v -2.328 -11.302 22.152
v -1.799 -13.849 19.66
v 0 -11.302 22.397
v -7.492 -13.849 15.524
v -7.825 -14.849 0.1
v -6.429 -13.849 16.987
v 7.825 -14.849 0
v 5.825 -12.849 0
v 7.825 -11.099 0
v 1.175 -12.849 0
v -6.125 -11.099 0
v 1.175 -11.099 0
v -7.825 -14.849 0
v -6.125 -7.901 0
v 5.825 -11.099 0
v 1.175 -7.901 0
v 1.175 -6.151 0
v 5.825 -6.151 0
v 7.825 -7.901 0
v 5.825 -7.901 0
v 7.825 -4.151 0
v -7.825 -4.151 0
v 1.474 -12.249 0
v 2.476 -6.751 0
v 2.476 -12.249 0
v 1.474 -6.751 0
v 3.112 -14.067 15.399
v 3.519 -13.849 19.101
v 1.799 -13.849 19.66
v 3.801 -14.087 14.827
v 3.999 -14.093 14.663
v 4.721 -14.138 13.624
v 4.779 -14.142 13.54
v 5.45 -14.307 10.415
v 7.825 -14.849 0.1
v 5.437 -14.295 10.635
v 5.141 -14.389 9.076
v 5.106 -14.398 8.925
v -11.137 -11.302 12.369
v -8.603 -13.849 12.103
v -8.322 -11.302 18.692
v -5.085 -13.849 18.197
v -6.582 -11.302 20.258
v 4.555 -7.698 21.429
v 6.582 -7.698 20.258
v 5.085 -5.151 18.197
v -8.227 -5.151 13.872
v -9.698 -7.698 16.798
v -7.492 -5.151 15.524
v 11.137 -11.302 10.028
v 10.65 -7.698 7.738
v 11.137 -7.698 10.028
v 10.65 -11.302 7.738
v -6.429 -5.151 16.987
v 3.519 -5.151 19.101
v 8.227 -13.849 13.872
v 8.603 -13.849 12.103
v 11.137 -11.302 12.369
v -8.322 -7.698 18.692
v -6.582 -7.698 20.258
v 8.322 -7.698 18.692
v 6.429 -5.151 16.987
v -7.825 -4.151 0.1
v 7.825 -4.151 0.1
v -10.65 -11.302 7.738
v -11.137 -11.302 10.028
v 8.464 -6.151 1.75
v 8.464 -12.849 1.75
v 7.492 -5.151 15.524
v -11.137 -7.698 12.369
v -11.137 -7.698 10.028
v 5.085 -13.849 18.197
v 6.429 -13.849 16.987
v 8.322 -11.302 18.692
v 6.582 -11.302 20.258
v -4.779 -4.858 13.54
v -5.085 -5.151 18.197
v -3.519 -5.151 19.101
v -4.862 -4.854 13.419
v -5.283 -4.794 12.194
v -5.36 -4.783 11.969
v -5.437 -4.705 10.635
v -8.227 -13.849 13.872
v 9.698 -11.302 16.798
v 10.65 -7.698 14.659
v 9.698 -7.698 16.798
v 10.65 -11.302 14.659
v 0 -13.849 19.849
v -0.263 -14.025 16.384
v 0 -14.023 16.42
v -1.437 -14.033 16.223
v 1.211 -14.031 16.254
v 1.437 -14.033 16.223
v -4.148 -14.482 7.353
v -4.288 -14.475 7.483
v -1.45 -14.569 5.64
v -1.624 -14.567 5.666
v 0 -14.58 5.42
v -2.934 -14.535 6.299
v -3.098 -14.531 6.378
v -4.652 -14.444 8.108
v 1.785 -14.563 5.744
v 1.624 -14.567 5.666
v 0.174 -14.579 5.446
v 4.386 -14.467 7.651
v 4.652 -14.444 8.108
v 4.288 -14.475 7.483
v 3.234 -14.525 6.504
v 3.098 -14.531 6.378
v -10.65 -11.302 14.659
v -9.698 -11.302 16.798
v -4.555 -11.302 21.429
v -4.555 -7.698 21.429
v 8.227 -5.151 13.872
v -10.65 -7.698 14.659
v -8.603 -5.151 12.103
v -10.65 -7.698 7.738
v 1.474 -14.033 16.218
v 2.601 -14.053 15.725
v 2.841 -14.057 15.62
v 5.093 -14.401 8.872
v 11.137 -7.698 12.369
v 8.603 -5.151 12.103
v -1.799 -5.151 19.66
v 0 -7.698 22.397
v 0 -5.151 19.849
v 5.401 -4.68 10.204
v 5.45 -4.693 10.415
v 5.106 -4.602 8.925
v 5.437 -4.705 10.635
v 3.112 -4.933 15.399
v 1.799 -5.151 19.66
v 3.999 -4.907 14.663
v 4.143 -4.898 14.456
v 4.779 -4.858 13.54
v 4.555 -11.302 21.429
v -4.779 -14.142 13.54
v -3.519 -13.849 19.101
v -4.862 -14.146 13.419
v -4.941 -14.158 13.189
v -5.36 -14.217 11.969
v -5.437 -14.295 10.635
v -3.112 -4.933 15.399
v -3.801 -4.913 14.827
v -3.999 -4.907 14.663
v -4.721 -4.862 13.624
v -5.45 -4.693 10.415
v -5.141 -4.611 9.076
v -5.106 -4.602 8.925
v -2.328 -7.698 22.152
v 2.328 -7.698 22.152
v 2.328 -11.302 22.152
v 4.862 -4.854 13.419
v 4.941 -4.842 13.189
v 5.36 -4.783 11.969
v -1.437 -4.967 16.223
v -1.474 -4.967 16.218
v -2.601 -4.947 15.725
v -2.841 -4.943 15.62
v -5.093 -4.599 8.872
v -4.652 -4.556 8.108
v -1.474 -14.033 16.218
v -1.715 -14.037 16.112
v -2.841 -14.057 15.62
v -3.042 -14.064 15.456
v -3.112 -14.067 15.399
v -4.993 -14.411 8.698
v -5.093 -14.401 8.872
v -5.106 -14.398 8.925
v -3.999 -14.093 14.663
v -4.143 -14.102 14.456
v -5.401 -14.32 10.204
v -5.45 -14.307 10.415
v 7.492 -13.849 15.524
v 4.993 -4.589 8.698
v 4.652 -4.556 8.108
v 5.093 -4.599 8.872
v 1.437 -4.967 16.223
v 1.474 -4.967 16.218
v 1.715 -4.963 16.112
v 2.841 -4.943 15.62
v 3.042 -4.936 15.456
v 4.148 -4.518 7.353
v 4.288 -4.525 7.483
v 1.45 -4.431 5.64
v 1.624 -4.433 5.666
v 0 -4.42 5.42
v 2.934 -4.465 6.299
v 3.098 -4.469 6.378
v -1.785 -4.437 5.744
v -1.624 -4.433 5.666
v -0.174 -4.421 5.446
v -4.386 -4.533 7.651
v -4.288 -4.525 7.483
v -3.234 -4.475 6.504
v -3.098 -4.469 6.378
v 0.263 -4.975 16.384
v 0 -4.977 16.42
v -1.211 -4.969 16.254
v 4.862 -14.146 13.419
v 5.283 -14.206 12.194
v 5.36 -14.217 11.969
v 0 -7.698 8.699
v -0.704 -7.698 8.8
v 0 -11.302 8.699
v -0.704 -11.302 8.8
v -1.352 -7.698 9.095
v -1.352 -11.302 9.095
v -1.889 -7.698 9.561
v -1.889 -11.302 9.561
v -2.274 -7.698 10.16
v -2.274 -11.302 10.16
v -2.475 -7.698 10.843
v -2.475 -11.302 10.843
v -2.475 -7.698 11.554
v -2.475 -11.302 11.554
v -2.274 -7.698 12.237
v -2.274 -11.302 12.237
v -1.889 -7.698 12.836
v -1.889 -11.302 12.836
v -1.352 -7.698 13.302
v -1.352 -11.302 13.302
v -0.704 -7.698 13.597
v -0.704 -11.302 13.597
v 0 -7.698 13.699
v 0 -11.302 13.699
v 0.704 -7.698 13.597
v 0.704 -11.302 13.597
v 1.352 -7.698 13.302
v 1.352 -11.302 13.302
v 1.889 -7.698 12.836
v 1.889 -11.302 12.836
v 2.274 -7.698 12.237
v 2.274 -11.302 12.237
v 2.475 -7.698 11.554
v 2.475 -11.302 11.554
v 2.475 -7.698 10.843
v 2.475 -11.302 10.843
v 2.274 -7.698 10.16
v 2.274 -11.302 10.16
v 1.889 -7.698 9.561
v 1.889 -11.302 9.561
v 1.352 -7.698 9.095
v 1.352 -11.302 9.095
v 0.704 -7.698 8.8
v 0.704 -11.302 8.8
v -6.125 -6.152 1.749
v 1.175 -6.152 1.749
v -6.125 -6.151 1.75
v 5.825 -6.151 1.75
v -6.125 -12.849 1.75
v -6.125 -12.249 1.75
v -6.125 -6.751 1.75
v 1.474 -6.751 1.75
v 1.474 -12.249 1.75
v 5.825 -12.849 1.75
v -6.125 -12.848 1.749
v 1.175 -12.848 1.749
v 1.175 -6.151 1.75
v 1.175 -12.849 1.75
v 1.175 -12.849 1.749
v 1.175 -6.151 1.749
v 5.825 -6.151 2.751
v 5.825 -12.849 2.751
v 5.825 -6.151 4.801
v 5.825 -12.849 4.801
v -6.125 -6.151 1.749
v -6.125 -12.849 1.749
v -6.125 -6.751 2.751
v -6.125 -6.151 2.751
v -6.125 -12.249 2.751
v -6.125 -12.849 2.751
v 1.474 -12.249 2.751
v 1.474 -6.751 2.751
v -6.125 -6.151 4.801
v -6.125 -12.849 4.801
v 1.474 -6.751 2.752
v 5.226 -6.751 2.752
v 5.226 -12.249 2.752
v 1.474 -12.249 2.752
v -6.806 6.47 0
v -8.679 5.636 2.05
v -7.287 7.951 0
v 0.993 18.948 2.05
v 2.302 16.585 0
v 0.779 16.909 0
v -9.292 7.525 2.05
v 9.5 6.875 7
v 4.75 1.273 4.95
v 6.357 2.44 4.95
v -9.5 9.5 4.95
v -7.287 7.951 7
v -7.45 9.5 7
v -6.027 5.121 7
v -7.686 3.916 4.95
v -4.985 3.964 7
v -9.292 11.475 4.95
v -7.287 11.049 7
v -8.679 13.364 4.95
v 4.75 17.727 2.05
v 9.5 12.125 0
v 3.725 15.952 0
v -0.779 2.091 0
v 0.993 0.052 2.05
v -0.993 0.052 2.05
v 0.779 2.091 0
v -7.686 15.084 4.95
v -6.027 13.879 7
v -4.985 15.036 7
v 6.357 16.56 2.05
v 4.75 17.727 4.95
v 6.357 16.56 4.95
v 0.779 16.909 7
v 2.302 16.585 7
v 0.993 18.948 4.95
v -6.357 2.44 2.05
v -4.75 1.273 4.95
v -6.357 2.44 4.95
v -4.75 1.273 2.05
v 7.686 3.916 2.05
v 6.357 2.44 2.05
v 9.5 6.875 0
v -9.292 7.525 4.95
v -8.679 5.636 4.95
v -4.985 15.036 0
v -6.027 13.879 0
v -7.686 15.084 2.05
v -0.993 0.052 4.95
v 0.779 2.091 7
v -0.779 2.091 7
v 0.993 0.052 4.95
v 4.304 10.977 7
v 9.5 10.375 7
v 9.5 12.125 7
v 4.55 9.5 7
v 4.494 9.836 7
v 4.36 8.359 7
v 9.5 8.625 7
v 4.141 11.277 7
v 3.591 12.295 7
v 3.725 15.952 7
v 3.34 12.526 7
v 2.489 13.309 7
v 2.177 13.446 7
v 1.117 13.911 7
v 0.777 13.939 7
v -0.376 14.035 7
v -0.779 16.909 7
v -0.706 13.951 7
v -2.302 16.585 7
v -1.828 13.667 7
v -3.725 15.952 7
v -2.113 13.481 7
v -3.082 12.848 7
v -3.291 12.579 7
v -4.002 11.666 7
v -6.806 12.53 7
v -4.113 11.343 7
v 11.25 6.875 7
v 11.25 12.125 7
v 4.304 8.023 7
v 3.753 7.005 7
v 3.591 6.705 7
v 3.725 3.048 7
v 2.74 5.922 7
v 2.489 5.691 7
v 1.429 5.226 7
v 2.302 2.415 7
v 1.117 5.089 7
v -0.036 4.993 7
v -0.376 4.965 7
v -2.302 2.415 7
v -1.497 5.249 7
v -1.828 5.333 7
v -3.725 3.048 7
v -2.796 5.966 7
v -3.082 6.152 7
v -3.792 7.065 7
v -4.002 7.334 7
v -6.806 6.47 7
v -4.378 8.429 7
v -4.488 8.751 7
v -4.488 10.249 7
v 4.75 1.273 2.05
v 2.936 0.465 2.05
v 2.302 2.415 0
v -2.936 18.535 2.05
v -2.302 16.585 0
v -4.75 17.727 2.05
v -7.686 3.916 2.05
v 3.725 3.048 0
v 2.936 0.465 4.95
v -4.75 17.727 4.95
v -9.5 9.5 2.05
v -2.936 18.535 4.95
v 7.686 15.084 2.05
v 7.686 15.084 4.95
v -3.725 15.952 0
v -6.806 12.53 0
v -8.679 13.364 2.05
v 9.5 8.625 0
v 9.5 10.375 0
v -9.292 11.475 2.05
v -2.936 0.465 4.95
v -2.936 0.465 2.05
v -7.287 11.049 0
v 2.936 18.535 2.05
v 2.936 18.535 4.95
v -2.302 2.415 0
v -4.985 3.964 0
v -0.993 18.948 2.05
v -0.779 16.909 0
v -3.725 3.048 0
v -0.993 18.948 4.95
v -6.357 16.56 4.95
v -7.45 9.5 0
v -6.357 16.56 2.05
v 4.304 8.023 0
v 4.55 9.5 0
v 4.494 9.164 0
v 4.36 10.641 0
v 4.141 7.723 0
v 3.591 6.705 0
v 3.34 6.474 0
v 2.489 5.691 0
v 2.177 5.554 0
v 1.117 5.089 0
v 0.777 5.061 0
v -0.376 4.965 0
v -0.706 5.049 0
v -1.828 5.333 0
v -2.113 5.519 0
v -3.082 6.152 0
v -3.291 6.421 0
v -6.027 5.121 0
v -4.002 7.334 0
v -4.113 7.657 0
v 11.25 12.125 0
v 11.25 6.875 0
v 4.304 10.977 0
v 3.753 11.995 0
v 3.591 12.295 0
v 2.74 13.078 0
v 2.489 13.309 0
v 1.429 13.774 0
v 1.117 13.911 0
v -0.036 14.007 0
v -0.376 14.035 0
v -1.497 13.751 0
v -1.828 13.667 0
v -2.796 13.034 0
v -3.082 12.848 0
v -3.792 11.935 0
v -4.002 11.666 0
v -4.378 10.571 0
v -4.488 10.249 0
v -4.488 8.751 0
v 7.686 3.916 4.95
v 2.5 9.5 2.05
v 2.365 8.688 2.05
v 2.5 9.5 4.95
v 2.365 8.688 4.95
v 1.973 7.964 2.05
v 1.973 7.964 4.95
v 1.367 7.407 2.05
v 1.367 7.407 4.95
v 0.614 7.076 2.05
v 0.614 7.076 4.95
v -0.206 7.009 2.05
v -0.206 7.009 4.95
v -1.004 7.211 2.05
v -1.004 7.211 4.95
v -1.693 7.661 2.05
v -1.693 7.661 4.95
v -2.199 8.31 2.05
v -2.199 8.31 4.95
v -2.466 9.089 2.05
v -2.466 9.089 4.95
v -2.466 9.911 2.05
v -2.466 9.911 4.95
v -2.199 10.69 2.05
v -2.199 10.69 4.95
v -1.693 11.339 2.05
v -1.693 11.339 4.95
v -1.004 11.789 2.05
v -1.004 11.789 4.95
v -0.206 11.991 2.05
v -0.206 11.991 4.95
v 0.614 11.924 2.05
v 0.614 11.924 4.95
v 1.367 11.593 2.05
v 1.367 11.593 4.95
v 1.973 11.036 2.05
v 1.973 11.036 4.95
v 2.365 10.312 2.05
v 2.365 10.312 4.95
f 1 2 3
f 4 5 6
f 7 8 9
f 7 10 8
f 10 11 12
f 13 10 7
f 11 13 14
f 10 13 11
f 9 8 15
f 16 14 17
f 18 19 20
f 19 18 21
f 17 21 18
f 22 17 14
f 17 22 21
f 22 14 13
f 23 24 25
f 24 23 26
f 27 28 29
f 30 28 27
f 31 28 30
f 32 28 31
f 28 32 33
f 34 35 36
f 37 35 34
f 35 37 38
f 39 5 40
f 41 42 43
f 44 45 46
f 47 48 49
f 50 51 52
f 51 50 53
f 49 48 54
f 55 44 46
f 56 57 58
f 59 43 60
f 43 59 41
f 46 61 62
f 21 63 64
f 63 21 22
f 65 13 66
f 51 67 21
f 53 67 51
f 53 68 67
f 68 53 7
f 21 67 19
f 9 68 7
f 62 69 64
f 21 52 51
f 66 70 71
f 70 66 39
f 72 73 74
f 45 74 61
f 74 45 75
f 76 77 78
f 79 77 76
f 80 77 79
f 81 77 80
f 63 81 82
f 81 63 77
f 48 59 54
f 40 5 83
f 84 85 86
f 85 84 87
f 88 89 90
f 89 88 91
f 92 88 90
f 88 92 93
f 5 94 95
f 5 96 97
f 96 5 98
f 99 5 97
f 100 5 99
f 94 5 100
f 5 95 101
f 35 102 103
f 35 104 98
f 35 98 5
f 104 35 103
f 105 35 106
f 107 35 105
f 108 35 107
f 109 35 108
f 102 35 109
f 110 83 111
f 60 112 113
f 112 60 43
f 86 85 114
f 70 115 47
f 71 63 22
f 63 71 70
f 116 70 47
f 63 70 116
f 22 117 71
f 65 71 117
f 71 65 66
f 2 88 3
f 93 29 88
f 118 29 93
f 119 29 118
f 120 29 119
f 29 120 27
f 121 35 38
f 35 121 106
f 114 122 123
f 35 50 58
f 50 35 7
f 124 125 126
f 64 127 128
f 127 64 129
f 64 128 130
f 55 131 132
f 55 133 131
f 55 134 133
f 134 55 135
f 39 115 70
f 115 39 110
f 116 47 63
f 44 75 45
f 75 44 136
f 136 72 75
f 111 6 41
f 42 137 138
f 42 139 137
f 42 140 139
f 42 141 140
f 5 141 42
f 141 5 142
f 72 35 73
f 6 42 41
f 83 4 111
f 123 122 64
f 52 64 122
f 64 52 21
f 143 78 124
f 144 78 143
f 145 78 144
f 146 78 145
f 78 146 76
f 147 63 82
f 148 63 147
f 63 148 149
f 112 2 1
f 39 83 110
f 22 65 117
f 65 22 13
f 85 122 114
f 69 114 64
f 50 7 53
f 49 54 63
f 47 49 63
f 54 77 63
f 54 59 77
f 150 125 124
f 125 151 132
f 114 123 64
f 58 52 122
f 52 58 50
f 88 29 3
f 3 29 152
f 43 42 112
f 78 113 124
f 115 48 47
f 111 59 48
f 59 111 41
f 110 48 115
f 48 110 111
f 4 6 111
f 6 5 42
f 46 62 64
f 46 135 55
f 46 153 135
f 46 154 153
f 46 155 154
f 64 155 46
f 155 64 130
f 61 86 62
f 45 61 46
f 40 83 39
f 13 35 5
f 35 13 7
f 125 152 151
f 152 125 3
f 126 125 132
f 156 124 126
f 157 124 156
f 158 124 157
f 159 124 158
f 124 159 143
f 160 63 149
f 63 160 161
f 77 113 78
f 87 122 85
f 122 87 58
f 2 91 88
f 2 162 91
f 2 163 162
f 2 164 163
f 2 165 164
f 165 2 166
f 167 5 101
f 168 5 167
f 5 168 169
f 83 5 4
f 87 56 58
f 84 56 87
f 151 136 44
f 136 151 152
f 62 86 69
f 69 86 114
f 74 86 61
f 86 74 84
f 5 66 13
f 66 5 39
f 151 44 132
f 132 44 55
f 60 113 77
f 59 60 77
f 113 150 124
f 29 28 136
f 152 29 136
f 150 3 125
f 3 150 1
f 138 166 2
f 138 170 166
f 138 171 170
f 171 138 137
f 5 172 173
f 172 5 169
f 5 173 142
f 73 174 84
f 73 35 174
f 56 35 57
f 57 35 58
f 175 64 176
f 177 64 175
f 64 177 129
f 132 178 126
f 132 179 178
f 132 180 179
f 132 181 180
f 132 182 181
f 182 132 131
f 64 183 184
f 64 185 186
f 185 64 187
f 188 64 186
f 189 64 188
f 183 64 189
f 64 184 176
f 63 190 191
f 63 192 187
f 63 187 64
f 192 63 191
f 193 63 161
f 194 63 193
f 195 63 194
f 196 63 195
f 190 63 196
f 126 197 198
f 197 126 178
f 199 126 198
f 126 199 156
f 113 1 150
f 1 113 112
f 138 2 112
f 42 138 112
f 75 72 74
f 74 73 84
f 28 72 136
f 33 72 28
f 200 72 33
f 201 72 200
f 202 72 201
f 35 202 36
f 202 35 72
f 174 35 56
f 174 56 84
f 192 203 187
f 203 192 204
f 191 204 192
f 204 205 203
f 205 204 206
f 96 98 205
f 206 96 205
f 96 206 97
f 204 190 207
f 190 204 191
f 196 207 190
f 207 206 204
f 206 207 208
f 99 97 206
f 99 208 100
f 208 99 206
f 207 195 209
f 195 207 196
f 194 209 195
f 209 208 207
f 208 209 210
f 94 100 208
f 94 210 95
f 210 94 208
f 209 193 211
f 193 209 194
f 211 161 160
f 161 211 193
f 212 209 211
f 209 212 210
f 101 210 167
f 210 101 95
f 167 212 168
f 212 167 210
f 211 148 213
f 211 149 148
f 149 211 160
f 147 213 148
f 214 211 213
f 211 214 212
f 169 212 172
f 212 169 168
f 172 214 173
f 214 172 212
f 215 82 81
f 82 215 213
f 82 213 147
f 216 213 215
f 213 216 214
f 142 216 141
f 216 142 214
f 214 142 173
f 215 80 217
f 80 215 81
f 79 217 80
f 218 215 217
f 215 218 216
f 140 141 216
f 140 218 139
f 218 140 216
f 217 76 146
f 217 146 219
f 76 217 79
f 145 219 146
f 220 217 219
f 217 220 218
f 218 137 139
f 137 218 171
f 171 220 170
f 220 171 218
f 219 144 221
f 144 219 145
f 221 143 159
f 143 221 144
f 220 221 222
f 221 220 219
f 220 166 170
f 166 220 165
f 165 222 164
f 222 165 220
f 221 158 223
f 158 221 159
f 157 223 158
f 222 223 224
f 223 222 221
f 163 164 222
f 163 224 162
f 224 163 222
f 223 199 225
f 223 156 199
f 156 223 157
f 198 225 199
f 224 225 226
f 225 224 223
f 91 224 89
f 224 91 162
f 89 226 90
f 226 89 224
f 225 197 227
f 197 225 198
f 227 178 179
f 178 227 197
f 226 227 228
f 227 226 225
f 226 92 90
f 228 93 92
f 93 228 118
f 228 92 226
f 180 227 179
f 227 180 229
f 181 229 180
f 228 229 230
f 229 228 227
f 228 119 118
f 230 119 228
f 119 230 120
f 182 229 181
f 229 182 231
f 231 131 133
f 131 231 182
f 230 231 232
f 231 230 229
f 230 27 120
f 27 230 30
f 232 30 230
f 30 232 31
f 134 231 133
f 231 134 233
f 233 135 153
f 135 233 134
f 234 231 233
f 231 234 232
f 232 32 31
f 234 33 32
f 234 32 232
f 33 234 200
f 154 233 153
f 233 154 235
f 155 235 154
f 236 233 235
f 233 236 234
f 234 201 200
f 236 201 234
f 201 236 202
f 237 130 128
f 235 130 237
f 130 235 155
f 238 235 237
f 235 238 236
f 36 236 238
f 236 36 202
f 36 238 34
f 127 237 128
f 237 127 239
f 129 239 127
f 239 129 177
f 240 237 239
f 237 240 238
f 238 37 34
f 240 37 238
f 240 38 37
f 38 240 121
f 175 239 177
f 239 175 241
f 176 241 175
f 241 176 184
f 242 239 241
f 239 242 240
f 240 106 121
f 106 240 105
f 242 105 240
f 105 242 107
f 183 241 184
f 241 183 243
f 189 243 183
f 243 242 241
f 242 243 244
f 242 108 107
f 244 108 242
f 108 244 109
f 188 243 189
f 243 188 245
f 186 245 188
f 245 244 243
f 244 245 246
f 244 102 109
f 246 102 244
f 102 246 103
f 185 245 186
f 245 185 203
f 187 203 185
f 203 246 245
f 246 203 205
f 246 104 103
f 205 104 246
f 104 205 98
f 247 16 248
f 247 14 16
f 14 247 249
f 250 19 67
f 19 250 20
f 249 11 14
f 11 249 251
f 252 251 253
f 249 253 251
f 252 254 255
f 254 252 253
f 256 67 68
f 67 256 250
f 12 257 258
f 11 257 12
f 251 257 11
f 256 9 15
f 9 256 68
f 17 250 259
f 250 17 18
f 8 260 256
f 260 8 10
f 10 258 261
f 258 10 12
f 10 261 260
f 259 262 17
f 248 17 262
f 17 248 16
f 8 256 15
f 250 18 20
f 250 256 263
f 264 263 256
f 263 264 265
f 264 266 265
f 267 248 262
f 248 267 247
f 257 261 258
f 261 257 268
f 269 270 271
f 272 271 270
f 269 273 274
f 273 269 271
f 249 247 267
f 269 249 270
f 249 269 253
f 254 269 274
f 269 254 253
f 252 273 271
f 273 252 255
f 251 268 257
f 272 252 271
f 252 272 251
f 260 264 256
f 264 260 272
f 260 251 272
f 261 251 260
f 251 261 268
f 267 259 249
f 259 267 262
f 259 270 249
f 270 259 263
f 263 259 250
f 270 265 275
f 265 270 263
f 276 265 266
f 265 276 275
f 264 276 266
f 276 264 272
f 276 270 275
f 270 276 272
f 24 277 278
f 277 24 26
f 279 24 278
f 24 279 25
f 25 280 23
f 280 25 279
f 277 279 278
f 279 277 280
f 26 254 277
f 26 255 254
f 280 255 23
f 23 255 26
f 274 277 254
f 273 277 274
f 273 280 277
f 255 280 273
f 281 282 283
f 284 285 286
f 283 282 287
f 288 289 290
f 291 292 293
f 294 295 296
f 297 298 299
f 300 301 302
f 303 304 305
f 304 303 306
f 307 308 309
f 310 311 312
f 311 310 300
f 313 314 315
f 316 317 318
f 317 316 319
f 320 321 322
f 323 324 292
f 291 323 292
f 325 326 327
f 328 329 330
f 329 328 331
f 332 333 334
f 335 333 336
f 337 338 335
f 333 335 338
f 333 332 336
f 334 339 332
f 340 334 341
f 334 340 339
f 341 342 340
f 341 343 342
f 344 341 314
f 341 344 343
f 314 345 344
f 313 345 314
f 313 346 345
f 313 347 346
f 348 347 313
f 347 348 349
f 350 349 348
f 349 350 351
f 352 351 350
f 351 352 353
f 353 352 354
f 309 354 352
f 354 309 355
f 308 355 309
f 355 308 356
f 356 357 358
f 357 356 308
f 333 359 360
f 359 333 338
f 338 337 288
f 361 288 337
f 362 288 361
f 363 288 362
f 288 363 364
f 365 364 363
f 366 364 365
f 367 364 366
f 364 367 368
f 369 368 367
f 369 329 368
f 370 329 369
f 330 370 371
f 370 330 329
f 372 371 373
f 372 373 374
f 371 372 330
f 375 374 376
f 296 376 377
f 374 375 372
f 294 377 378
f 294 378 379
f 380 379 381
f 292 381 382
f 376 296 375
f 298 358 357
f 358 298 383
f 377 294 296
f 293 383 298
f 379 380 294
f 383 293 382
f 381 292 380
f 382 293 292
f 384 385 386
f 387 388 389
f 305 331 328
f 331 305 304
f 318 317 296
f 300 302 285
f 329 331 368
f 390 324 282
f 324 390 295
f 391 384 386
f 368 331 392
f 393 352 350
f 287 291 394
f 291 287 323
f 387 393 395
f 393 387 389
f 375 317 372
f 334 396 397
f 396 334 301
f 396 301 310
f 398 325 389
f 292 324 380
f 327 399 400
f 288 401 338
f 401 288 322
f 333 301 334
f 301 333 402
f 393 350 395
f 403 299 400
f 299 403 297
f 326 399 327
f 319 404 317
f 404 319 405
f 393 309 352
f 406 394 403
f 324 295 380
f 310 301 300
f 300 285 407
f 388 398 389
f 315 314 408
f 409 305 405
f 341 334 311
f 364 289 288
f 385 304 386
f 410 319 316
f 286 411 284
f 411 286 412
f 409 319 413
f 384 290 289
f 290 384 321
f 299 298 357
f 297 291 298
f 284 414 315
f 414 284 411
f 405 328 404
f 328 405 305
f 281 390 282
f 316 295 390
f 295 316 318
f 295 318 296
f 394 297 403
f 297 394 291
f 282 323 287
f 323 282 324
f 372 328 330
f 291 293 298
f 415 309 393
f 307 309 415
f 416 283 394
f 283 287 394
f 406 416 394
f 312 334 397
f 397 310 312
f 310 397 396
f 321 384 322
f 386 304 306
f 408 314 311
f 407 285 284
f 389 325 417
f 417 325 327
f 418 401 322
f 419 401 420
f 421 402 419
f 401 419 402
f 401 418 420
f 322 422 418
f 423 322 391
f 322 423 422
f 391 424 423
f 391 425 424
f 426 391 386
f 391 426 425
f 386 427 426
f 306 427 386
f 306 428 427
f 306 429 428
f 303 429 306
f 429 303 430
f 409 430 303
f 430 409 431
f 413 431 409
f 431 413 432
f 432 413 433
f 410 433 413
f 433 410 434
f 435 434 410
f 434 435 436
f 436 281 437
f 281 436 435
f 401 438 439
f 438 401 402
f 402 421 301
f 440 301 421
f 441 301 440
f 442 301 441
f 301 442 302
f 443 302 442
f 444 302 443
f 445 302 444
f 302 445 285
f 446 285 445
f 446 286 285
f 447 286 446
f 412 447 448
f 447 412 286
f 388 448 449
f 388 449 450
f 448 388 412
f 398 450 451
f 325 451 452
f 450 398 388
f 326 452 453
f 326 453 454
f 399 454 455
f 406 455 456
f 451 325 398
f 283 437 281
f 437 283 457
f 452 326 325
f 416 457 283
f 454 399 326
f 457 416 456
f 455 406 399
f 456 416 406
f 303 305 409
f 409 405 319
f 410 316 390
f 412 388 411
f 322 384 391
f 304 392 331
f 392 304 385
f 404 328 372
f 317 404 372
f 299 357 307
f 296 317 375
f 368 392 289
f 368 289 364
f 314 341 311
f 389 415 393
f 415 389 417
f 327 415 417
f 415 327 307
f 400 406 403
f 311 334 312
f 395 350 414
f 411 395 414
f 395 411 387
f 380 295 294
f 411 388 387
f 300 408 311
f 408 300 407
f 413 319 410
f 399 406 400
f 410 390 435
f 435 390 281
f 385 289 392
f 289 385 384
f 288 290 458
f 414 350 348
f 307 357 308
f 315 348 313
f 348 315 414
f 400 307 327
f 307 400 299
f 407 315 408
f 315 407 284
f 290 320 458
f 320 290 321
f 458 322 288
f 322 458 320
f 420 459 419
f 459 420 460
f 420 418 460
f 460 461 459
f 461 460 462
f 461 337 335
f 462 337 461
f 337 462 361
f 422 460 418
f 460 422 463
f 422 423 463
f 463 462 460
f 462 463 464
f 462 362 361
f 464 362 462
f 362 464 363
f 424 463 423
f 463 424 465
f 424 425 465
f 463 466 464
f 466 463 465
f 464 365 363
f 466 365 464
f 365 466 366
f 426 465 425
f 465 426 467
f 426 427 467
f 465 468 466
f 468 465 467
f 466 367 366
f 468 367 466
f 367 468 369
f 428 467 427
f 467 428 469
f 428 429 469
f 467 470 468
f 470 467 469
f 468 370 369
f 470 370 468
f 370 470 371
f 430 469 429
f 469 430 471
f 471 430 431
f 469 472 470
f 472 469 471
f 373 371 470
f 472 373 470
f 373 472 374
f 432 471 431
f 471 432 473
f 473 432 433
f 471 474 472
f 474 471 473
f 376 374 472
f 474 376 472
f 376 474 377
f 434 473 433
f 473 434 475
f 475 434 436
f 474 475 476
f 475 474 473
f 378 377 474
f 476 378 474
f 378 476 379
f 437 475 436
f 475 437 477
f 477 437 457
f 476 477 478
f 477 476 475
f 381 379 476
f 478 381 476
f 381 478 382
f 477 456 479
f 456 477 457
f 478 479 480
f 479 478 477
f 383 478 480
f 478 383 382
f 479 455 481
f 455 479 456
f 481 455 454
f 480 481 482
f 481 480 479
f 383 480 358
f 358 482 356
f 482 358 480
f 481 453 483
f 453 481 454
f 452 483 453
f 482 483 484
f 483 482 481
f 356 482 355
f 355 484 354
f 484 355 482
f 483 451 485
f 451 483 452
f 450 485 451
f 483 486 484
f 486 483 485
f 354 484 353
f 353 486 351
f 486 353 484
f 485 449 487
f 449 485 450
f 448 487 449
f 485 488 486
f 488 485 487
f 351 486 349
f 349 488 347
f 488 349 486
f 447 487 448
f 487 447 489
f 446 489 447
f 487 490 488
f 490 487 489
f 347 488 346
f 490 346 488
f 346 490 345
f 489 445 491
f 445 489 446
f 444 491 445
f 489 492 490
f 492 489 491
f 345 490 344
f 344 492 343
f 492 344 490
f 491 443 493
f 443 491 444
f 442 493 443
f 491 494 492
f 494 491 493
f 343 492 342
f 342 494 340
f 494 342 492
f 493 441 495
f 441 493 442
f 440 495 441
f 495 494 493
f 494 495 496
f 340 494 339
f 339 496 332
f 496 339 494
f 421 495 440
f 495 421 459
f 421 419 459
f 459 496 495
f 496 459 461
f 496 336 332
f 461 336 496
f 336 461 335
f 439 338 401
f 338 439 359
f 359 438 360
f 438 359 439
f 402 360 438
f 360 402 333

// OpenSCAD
/*
This work is lincensed by Benjamin E Morgan under a Creative Commons Attribution 4.0 International License
http://creativecommons.org/licenses/by/4.0/

Original Source: https://github.com/benjamin-edward-morgan/openscad-slide-n-snap

These are test objects utilizing the slide-n-snap library. These test objects can be used to calibrate the 3D printer being used to print objects with slide-n-snap, to experiment with and fine-tune the parameters, or to test the strength of the connection between assembled test parts.

*/

include<slide-n-snap.scad>;

/**** Uncomment a test plate profile ****/
PLATE="test_a"; 
//PLATE="test_b";
//PLATE="female_negative";
//PLATE="male_positive";
/**** Uncomment a size profile****/
SIZE="small";
//SIZE="medium";
//SIZE="large";

/*************************************/
/**slide-n-snap test part definitons**/
/*************************************/

ring_test();
/* 
Variables in the size profiles below are the same as those defined in slide-n-snap.scad with two additions:
ring_inner_d is the inner diameter of the rings
ring_bulk is how much extra plastic is added around the ring
*/
module ring_test() {
    if(SIZE=="small") {
        t=1.75;w=5.25;l=7;g=0.3;j=0.6;h=1;s=1;a=7;ring_inner_d=5;ring_bulk=2;
        ring_test_plate(t=t,w=w,l=l,g=g,j=j,h=h,s=s,a=a,ring_inner_d=ring_inner_d,ring_bulk=ring_bulk);
    } else if (SIZE=="medium") {
        t=2.0;w=6.5;l=8.5;g=0.35;j=0.7;h=1.2;s=1;a=8.5;ring_inner_d=5;ring_bulk=2;
        ring_test_plate(t=t,w=w,l=l,g=g,j=j,h=h,s=s,a=a,ring_inner_d=ring_inner_d,ring_bulk=ring_bulk);
    } else if (SIZE=="large") {
        t=2.75;w=8;l=10;g=0.4;j=0.8;h=2;s=1.5;a=10;ring_inner_d=5;ring_bulk=2;
        ring_test_plate(t=t,w=w,l=l,g=g,j=j,h=h,s=s,a=a,ring_inner_d=ring_inner_d,ring_bulk=ring_bulk);
    } else {
        echo("SIZE is invalid");
    }
}

module ring_test_plate(t,w,l,g,j,h,s,a,ring_inner_d,ring_bulk) {
    if(PLATE=="test_a") {
        ring_test_plate_a(t=t,w=w,l=l,g=g,j=j,h=h,s=s,a=a,ring_inner_d=ring_inner_d,ring_bulk=ring_bulk);
    } else if(PLATE=="test_b") {
        ring_test_plate_b(t=t,w=w,l=l,g=g,j=j,h=h,s=s,a=a,ring_inner_d=ring_inner_d,ring_bulk=ring_bulk);
    } else if(PLATE=="female_negative") {
        slide_n_snap_female_clip_negative(t=t,w=w,g=g,j=j,l=l,h=h,s=s,a=a,c=20);
    } else if (PLATE=="male_positive") {
        slide_n_snap_male_clip(t=t,w=w,l=l);
    } else {
       echo("PLATE is invalid");
    }
}


/*
Test Plates to measure tensile strength of assembly
*/
module ring_test_plate_a(t,w,l,g,j,h,s,a,ring_inner_d,ring_bulk) {
    dist = l+ring_inner_d*2+ring_bulk;
    rotate(90) {
        translate([-dist/2,0,0])
        slide_n_snap_female_clip_ring_test_a(t=t,w=w,l=l,g=g,j=j,h=h,s=s,a=a,ring_inner_d=ring_inner_d,ring_bulk=ring_bulk);  
        translate([dist/2,0,0])
        rotate(180)
        slide_n_snap_male_clip_ring_test_a(t=t,w=w,l=l,g=g,ring_inner_d=ring_inner_d);
    }
}

module ring_test_plate_b(t,w,l,g,j,h,s,a,ring_inner_d,ring_bulk) {
    slide_n_snap_female_clip_ring_test_b(t=t,w=w,l=l,g=g,j=j,h=h,s=s,a=a,ring_inner_d=ring_inner_d,ring_bulk=ring_bulk);  

    ssfmllength = slide_n_snap_female_length(w=w,t=t,g=g,j=j,h=h,l=l,s=s);
    for(i=[0,1])
    mirror([i,0,0])    
    translate([w,-ssfmllength/2-2*ring_bulk-w,0])
    slide_n_snap_male_clip_ring_test_b(t=t,w=w,l=l,g=g,ring_inner_d=ring_inner_d,ring_bulk=ring_bulk);
}

//slide_n_snap_female_clip_ring_test_b(t=1.75,w=5.25,l=7,g=0.3,j=0.6,h=1,s=0.8,a=7,ring_inner_d=5,ring_bulk=2);
module slide_n_snap_female_clip_ring_test_b(t,w,l,g,j,h,s,a,ring_inner_d,ring_bulk) {
    
    thickness = slide_n_snap_clip_height(t=t,w=w,s=s);
    ssfmlwidth = slide_n_snap_channel_width(w=w,g=g);
    ssfmllength = slide_n_snap_female_length(w=w,t=t,g=g,j=j,h=h,l=l,s=s);
    separation = ring_inner_d+2*ring_bulk;
    
    difference() {
        linear_extrude(thickness)
        difference() {
          square(size=[(ssfmlwidth+2*ring_bulk)*2+separation,ssfmllength+4*ring_bulk],center=true);
          circle(r=ring_inner_d/2,$fn=16);
        }
    
        translate([separation/2+ssfmlwidth/2,ssfmllength/2,0])
        slide_n_snap_upside_down_female_clip_negative(t=t,w=w,g=g,j=j,l=l,h=h,s=s,a=a,c=20);
        
        translate([-separation/2-ssfmlwidth/2,ssfmllength/2,0])    
        slide_n_snap_female_clip_negative(t=t,w=w,g=g,j=j,l=l,h=h,s=s,a=a,c=20);
    }
}


//slide_n_snap_male_clip_ring_test_b(t=1.75,w=5.25,l=7,ring_inner_d=5,ring_bulk=2);
module slide_n_snap_male_clip_ring_test_b(t,w,l,ring_inner_d,ring_bulk,$fn=32) {
    union() {
        slide_n_snap_male_clip(t=t,w=w,l=l);
        
        ring_outer_r = ring_inner_d/2+max(ring_bulk,w/2);
        rotate([90,0,0])
        linear_extrude(ring_bulk*2)
        difference() 
        {
            hull() 
            {    
              translate([ring_outer_r+2*ring_bulk,ring_outer_r])
              circle(r=ring_outer_r);
              
              translate([ring_outer_r+2*ring_bulk,0])  
              square(size=[ring_outer_r,ring_outer_r]);  
                
              translate([-w/2,0])    
              square(size=[w,l]);  
            }
        
            translate([ring_outer_r+2*ring_bulk,ring_outer_r])
            circle(r=ring_inner_d/2);
        }
    }
}


//slide_n_snap_female_clip_ring_test_a(t=1.75,w=5.25,l=7,g=0.3,j=0.6,h=1,s=0.8,a=7,ring_inner_d=5,ring_bulk=2);
module slide_n_snap_female_clip_ring_test_a(t,w,l,g,j,h,s,a,ring_inner_d) {
    fml_len=slide_n_snap_female_length(w,t,g,j,h,l,s);
    fml_wid=slide_n_snap_channel_width(w,g);
    ring_r2=fml_wid/2+ring_bulk/2;
    ring_r1=ring_inner_d/2+ring_r2;
    ring_a = fml_wid+2*ring_bulk;
    ring_b = fml_len+2*ring_bulk;

    difference() {
        rotate([0,-90,0])
        ring(r1=ring_r1,r2=ring_r2,a=ring_a,b=ring_b);
    
        translate([0,fml_len/2,0])
        slide_n_snap_female_clip_negative(t=t,w=w,g=g,j=j,l=l,h=h,s=s,a=a,c=ring_r1);
    }
}

//slide_n_snap_male_clip_ring_test_a(t=1.75,w=5.25,l=7,ring_inner_d=5);
module slide_n_snap_male_clip_ring_test_a(t,w,l,ring_inner_d) {  
    ring_r2=l/2;
    ring_r1=ring_inner_d/2+ring_r2;
    
    translate([0,ring_r1+ring_r2,0])
    union() {        
        translate([0,0,ring_r2])
        rotate(-90)
        ring(r1=ring_r1,r2=ring_r2,a=ring_r2*2,b=w);
        
        slide_n_snap_male_clip(t=t,w=w,l=l);
    }
}

/*
A ring with a flat region on the exterior. major radius is r1, minor radius is r2. a is the width of the flat region and b is the length. To print flat, r2*2 must equal a.
*/
//ring(r1=4,r2=2,a=5,b=5);
module ring(r1,r2,a,b) {
  difference() 
  {   
      hull() 
      {  
          translate([r1+r2,0,0])  
          rotate_extrude() 
          {  
              translate([r1,0,0])  
              rotate(360/16)    
              circle(r=r2/cos(360/16),$fn=8);   
          }

          translate([0.1/2,0,0])
          cube(center=true,size=[0.1,b,a]);
      }
      
      translate([r1+r2,0,0])
      rotate_extrude() 
      polygon(points=[
        [0,-a/2-10],
        [r1,-a/2-10],
        [r1,-sqrt(2)*r2],
        [r1-r2,-r2*tan(360/16)],
        [r1-r2,r2*tan(360/16)],
        [r1,sqrt(2)*r2],
        [r1,a/2+10],
        [0,a/2+10]
      ]);          
  }
}
